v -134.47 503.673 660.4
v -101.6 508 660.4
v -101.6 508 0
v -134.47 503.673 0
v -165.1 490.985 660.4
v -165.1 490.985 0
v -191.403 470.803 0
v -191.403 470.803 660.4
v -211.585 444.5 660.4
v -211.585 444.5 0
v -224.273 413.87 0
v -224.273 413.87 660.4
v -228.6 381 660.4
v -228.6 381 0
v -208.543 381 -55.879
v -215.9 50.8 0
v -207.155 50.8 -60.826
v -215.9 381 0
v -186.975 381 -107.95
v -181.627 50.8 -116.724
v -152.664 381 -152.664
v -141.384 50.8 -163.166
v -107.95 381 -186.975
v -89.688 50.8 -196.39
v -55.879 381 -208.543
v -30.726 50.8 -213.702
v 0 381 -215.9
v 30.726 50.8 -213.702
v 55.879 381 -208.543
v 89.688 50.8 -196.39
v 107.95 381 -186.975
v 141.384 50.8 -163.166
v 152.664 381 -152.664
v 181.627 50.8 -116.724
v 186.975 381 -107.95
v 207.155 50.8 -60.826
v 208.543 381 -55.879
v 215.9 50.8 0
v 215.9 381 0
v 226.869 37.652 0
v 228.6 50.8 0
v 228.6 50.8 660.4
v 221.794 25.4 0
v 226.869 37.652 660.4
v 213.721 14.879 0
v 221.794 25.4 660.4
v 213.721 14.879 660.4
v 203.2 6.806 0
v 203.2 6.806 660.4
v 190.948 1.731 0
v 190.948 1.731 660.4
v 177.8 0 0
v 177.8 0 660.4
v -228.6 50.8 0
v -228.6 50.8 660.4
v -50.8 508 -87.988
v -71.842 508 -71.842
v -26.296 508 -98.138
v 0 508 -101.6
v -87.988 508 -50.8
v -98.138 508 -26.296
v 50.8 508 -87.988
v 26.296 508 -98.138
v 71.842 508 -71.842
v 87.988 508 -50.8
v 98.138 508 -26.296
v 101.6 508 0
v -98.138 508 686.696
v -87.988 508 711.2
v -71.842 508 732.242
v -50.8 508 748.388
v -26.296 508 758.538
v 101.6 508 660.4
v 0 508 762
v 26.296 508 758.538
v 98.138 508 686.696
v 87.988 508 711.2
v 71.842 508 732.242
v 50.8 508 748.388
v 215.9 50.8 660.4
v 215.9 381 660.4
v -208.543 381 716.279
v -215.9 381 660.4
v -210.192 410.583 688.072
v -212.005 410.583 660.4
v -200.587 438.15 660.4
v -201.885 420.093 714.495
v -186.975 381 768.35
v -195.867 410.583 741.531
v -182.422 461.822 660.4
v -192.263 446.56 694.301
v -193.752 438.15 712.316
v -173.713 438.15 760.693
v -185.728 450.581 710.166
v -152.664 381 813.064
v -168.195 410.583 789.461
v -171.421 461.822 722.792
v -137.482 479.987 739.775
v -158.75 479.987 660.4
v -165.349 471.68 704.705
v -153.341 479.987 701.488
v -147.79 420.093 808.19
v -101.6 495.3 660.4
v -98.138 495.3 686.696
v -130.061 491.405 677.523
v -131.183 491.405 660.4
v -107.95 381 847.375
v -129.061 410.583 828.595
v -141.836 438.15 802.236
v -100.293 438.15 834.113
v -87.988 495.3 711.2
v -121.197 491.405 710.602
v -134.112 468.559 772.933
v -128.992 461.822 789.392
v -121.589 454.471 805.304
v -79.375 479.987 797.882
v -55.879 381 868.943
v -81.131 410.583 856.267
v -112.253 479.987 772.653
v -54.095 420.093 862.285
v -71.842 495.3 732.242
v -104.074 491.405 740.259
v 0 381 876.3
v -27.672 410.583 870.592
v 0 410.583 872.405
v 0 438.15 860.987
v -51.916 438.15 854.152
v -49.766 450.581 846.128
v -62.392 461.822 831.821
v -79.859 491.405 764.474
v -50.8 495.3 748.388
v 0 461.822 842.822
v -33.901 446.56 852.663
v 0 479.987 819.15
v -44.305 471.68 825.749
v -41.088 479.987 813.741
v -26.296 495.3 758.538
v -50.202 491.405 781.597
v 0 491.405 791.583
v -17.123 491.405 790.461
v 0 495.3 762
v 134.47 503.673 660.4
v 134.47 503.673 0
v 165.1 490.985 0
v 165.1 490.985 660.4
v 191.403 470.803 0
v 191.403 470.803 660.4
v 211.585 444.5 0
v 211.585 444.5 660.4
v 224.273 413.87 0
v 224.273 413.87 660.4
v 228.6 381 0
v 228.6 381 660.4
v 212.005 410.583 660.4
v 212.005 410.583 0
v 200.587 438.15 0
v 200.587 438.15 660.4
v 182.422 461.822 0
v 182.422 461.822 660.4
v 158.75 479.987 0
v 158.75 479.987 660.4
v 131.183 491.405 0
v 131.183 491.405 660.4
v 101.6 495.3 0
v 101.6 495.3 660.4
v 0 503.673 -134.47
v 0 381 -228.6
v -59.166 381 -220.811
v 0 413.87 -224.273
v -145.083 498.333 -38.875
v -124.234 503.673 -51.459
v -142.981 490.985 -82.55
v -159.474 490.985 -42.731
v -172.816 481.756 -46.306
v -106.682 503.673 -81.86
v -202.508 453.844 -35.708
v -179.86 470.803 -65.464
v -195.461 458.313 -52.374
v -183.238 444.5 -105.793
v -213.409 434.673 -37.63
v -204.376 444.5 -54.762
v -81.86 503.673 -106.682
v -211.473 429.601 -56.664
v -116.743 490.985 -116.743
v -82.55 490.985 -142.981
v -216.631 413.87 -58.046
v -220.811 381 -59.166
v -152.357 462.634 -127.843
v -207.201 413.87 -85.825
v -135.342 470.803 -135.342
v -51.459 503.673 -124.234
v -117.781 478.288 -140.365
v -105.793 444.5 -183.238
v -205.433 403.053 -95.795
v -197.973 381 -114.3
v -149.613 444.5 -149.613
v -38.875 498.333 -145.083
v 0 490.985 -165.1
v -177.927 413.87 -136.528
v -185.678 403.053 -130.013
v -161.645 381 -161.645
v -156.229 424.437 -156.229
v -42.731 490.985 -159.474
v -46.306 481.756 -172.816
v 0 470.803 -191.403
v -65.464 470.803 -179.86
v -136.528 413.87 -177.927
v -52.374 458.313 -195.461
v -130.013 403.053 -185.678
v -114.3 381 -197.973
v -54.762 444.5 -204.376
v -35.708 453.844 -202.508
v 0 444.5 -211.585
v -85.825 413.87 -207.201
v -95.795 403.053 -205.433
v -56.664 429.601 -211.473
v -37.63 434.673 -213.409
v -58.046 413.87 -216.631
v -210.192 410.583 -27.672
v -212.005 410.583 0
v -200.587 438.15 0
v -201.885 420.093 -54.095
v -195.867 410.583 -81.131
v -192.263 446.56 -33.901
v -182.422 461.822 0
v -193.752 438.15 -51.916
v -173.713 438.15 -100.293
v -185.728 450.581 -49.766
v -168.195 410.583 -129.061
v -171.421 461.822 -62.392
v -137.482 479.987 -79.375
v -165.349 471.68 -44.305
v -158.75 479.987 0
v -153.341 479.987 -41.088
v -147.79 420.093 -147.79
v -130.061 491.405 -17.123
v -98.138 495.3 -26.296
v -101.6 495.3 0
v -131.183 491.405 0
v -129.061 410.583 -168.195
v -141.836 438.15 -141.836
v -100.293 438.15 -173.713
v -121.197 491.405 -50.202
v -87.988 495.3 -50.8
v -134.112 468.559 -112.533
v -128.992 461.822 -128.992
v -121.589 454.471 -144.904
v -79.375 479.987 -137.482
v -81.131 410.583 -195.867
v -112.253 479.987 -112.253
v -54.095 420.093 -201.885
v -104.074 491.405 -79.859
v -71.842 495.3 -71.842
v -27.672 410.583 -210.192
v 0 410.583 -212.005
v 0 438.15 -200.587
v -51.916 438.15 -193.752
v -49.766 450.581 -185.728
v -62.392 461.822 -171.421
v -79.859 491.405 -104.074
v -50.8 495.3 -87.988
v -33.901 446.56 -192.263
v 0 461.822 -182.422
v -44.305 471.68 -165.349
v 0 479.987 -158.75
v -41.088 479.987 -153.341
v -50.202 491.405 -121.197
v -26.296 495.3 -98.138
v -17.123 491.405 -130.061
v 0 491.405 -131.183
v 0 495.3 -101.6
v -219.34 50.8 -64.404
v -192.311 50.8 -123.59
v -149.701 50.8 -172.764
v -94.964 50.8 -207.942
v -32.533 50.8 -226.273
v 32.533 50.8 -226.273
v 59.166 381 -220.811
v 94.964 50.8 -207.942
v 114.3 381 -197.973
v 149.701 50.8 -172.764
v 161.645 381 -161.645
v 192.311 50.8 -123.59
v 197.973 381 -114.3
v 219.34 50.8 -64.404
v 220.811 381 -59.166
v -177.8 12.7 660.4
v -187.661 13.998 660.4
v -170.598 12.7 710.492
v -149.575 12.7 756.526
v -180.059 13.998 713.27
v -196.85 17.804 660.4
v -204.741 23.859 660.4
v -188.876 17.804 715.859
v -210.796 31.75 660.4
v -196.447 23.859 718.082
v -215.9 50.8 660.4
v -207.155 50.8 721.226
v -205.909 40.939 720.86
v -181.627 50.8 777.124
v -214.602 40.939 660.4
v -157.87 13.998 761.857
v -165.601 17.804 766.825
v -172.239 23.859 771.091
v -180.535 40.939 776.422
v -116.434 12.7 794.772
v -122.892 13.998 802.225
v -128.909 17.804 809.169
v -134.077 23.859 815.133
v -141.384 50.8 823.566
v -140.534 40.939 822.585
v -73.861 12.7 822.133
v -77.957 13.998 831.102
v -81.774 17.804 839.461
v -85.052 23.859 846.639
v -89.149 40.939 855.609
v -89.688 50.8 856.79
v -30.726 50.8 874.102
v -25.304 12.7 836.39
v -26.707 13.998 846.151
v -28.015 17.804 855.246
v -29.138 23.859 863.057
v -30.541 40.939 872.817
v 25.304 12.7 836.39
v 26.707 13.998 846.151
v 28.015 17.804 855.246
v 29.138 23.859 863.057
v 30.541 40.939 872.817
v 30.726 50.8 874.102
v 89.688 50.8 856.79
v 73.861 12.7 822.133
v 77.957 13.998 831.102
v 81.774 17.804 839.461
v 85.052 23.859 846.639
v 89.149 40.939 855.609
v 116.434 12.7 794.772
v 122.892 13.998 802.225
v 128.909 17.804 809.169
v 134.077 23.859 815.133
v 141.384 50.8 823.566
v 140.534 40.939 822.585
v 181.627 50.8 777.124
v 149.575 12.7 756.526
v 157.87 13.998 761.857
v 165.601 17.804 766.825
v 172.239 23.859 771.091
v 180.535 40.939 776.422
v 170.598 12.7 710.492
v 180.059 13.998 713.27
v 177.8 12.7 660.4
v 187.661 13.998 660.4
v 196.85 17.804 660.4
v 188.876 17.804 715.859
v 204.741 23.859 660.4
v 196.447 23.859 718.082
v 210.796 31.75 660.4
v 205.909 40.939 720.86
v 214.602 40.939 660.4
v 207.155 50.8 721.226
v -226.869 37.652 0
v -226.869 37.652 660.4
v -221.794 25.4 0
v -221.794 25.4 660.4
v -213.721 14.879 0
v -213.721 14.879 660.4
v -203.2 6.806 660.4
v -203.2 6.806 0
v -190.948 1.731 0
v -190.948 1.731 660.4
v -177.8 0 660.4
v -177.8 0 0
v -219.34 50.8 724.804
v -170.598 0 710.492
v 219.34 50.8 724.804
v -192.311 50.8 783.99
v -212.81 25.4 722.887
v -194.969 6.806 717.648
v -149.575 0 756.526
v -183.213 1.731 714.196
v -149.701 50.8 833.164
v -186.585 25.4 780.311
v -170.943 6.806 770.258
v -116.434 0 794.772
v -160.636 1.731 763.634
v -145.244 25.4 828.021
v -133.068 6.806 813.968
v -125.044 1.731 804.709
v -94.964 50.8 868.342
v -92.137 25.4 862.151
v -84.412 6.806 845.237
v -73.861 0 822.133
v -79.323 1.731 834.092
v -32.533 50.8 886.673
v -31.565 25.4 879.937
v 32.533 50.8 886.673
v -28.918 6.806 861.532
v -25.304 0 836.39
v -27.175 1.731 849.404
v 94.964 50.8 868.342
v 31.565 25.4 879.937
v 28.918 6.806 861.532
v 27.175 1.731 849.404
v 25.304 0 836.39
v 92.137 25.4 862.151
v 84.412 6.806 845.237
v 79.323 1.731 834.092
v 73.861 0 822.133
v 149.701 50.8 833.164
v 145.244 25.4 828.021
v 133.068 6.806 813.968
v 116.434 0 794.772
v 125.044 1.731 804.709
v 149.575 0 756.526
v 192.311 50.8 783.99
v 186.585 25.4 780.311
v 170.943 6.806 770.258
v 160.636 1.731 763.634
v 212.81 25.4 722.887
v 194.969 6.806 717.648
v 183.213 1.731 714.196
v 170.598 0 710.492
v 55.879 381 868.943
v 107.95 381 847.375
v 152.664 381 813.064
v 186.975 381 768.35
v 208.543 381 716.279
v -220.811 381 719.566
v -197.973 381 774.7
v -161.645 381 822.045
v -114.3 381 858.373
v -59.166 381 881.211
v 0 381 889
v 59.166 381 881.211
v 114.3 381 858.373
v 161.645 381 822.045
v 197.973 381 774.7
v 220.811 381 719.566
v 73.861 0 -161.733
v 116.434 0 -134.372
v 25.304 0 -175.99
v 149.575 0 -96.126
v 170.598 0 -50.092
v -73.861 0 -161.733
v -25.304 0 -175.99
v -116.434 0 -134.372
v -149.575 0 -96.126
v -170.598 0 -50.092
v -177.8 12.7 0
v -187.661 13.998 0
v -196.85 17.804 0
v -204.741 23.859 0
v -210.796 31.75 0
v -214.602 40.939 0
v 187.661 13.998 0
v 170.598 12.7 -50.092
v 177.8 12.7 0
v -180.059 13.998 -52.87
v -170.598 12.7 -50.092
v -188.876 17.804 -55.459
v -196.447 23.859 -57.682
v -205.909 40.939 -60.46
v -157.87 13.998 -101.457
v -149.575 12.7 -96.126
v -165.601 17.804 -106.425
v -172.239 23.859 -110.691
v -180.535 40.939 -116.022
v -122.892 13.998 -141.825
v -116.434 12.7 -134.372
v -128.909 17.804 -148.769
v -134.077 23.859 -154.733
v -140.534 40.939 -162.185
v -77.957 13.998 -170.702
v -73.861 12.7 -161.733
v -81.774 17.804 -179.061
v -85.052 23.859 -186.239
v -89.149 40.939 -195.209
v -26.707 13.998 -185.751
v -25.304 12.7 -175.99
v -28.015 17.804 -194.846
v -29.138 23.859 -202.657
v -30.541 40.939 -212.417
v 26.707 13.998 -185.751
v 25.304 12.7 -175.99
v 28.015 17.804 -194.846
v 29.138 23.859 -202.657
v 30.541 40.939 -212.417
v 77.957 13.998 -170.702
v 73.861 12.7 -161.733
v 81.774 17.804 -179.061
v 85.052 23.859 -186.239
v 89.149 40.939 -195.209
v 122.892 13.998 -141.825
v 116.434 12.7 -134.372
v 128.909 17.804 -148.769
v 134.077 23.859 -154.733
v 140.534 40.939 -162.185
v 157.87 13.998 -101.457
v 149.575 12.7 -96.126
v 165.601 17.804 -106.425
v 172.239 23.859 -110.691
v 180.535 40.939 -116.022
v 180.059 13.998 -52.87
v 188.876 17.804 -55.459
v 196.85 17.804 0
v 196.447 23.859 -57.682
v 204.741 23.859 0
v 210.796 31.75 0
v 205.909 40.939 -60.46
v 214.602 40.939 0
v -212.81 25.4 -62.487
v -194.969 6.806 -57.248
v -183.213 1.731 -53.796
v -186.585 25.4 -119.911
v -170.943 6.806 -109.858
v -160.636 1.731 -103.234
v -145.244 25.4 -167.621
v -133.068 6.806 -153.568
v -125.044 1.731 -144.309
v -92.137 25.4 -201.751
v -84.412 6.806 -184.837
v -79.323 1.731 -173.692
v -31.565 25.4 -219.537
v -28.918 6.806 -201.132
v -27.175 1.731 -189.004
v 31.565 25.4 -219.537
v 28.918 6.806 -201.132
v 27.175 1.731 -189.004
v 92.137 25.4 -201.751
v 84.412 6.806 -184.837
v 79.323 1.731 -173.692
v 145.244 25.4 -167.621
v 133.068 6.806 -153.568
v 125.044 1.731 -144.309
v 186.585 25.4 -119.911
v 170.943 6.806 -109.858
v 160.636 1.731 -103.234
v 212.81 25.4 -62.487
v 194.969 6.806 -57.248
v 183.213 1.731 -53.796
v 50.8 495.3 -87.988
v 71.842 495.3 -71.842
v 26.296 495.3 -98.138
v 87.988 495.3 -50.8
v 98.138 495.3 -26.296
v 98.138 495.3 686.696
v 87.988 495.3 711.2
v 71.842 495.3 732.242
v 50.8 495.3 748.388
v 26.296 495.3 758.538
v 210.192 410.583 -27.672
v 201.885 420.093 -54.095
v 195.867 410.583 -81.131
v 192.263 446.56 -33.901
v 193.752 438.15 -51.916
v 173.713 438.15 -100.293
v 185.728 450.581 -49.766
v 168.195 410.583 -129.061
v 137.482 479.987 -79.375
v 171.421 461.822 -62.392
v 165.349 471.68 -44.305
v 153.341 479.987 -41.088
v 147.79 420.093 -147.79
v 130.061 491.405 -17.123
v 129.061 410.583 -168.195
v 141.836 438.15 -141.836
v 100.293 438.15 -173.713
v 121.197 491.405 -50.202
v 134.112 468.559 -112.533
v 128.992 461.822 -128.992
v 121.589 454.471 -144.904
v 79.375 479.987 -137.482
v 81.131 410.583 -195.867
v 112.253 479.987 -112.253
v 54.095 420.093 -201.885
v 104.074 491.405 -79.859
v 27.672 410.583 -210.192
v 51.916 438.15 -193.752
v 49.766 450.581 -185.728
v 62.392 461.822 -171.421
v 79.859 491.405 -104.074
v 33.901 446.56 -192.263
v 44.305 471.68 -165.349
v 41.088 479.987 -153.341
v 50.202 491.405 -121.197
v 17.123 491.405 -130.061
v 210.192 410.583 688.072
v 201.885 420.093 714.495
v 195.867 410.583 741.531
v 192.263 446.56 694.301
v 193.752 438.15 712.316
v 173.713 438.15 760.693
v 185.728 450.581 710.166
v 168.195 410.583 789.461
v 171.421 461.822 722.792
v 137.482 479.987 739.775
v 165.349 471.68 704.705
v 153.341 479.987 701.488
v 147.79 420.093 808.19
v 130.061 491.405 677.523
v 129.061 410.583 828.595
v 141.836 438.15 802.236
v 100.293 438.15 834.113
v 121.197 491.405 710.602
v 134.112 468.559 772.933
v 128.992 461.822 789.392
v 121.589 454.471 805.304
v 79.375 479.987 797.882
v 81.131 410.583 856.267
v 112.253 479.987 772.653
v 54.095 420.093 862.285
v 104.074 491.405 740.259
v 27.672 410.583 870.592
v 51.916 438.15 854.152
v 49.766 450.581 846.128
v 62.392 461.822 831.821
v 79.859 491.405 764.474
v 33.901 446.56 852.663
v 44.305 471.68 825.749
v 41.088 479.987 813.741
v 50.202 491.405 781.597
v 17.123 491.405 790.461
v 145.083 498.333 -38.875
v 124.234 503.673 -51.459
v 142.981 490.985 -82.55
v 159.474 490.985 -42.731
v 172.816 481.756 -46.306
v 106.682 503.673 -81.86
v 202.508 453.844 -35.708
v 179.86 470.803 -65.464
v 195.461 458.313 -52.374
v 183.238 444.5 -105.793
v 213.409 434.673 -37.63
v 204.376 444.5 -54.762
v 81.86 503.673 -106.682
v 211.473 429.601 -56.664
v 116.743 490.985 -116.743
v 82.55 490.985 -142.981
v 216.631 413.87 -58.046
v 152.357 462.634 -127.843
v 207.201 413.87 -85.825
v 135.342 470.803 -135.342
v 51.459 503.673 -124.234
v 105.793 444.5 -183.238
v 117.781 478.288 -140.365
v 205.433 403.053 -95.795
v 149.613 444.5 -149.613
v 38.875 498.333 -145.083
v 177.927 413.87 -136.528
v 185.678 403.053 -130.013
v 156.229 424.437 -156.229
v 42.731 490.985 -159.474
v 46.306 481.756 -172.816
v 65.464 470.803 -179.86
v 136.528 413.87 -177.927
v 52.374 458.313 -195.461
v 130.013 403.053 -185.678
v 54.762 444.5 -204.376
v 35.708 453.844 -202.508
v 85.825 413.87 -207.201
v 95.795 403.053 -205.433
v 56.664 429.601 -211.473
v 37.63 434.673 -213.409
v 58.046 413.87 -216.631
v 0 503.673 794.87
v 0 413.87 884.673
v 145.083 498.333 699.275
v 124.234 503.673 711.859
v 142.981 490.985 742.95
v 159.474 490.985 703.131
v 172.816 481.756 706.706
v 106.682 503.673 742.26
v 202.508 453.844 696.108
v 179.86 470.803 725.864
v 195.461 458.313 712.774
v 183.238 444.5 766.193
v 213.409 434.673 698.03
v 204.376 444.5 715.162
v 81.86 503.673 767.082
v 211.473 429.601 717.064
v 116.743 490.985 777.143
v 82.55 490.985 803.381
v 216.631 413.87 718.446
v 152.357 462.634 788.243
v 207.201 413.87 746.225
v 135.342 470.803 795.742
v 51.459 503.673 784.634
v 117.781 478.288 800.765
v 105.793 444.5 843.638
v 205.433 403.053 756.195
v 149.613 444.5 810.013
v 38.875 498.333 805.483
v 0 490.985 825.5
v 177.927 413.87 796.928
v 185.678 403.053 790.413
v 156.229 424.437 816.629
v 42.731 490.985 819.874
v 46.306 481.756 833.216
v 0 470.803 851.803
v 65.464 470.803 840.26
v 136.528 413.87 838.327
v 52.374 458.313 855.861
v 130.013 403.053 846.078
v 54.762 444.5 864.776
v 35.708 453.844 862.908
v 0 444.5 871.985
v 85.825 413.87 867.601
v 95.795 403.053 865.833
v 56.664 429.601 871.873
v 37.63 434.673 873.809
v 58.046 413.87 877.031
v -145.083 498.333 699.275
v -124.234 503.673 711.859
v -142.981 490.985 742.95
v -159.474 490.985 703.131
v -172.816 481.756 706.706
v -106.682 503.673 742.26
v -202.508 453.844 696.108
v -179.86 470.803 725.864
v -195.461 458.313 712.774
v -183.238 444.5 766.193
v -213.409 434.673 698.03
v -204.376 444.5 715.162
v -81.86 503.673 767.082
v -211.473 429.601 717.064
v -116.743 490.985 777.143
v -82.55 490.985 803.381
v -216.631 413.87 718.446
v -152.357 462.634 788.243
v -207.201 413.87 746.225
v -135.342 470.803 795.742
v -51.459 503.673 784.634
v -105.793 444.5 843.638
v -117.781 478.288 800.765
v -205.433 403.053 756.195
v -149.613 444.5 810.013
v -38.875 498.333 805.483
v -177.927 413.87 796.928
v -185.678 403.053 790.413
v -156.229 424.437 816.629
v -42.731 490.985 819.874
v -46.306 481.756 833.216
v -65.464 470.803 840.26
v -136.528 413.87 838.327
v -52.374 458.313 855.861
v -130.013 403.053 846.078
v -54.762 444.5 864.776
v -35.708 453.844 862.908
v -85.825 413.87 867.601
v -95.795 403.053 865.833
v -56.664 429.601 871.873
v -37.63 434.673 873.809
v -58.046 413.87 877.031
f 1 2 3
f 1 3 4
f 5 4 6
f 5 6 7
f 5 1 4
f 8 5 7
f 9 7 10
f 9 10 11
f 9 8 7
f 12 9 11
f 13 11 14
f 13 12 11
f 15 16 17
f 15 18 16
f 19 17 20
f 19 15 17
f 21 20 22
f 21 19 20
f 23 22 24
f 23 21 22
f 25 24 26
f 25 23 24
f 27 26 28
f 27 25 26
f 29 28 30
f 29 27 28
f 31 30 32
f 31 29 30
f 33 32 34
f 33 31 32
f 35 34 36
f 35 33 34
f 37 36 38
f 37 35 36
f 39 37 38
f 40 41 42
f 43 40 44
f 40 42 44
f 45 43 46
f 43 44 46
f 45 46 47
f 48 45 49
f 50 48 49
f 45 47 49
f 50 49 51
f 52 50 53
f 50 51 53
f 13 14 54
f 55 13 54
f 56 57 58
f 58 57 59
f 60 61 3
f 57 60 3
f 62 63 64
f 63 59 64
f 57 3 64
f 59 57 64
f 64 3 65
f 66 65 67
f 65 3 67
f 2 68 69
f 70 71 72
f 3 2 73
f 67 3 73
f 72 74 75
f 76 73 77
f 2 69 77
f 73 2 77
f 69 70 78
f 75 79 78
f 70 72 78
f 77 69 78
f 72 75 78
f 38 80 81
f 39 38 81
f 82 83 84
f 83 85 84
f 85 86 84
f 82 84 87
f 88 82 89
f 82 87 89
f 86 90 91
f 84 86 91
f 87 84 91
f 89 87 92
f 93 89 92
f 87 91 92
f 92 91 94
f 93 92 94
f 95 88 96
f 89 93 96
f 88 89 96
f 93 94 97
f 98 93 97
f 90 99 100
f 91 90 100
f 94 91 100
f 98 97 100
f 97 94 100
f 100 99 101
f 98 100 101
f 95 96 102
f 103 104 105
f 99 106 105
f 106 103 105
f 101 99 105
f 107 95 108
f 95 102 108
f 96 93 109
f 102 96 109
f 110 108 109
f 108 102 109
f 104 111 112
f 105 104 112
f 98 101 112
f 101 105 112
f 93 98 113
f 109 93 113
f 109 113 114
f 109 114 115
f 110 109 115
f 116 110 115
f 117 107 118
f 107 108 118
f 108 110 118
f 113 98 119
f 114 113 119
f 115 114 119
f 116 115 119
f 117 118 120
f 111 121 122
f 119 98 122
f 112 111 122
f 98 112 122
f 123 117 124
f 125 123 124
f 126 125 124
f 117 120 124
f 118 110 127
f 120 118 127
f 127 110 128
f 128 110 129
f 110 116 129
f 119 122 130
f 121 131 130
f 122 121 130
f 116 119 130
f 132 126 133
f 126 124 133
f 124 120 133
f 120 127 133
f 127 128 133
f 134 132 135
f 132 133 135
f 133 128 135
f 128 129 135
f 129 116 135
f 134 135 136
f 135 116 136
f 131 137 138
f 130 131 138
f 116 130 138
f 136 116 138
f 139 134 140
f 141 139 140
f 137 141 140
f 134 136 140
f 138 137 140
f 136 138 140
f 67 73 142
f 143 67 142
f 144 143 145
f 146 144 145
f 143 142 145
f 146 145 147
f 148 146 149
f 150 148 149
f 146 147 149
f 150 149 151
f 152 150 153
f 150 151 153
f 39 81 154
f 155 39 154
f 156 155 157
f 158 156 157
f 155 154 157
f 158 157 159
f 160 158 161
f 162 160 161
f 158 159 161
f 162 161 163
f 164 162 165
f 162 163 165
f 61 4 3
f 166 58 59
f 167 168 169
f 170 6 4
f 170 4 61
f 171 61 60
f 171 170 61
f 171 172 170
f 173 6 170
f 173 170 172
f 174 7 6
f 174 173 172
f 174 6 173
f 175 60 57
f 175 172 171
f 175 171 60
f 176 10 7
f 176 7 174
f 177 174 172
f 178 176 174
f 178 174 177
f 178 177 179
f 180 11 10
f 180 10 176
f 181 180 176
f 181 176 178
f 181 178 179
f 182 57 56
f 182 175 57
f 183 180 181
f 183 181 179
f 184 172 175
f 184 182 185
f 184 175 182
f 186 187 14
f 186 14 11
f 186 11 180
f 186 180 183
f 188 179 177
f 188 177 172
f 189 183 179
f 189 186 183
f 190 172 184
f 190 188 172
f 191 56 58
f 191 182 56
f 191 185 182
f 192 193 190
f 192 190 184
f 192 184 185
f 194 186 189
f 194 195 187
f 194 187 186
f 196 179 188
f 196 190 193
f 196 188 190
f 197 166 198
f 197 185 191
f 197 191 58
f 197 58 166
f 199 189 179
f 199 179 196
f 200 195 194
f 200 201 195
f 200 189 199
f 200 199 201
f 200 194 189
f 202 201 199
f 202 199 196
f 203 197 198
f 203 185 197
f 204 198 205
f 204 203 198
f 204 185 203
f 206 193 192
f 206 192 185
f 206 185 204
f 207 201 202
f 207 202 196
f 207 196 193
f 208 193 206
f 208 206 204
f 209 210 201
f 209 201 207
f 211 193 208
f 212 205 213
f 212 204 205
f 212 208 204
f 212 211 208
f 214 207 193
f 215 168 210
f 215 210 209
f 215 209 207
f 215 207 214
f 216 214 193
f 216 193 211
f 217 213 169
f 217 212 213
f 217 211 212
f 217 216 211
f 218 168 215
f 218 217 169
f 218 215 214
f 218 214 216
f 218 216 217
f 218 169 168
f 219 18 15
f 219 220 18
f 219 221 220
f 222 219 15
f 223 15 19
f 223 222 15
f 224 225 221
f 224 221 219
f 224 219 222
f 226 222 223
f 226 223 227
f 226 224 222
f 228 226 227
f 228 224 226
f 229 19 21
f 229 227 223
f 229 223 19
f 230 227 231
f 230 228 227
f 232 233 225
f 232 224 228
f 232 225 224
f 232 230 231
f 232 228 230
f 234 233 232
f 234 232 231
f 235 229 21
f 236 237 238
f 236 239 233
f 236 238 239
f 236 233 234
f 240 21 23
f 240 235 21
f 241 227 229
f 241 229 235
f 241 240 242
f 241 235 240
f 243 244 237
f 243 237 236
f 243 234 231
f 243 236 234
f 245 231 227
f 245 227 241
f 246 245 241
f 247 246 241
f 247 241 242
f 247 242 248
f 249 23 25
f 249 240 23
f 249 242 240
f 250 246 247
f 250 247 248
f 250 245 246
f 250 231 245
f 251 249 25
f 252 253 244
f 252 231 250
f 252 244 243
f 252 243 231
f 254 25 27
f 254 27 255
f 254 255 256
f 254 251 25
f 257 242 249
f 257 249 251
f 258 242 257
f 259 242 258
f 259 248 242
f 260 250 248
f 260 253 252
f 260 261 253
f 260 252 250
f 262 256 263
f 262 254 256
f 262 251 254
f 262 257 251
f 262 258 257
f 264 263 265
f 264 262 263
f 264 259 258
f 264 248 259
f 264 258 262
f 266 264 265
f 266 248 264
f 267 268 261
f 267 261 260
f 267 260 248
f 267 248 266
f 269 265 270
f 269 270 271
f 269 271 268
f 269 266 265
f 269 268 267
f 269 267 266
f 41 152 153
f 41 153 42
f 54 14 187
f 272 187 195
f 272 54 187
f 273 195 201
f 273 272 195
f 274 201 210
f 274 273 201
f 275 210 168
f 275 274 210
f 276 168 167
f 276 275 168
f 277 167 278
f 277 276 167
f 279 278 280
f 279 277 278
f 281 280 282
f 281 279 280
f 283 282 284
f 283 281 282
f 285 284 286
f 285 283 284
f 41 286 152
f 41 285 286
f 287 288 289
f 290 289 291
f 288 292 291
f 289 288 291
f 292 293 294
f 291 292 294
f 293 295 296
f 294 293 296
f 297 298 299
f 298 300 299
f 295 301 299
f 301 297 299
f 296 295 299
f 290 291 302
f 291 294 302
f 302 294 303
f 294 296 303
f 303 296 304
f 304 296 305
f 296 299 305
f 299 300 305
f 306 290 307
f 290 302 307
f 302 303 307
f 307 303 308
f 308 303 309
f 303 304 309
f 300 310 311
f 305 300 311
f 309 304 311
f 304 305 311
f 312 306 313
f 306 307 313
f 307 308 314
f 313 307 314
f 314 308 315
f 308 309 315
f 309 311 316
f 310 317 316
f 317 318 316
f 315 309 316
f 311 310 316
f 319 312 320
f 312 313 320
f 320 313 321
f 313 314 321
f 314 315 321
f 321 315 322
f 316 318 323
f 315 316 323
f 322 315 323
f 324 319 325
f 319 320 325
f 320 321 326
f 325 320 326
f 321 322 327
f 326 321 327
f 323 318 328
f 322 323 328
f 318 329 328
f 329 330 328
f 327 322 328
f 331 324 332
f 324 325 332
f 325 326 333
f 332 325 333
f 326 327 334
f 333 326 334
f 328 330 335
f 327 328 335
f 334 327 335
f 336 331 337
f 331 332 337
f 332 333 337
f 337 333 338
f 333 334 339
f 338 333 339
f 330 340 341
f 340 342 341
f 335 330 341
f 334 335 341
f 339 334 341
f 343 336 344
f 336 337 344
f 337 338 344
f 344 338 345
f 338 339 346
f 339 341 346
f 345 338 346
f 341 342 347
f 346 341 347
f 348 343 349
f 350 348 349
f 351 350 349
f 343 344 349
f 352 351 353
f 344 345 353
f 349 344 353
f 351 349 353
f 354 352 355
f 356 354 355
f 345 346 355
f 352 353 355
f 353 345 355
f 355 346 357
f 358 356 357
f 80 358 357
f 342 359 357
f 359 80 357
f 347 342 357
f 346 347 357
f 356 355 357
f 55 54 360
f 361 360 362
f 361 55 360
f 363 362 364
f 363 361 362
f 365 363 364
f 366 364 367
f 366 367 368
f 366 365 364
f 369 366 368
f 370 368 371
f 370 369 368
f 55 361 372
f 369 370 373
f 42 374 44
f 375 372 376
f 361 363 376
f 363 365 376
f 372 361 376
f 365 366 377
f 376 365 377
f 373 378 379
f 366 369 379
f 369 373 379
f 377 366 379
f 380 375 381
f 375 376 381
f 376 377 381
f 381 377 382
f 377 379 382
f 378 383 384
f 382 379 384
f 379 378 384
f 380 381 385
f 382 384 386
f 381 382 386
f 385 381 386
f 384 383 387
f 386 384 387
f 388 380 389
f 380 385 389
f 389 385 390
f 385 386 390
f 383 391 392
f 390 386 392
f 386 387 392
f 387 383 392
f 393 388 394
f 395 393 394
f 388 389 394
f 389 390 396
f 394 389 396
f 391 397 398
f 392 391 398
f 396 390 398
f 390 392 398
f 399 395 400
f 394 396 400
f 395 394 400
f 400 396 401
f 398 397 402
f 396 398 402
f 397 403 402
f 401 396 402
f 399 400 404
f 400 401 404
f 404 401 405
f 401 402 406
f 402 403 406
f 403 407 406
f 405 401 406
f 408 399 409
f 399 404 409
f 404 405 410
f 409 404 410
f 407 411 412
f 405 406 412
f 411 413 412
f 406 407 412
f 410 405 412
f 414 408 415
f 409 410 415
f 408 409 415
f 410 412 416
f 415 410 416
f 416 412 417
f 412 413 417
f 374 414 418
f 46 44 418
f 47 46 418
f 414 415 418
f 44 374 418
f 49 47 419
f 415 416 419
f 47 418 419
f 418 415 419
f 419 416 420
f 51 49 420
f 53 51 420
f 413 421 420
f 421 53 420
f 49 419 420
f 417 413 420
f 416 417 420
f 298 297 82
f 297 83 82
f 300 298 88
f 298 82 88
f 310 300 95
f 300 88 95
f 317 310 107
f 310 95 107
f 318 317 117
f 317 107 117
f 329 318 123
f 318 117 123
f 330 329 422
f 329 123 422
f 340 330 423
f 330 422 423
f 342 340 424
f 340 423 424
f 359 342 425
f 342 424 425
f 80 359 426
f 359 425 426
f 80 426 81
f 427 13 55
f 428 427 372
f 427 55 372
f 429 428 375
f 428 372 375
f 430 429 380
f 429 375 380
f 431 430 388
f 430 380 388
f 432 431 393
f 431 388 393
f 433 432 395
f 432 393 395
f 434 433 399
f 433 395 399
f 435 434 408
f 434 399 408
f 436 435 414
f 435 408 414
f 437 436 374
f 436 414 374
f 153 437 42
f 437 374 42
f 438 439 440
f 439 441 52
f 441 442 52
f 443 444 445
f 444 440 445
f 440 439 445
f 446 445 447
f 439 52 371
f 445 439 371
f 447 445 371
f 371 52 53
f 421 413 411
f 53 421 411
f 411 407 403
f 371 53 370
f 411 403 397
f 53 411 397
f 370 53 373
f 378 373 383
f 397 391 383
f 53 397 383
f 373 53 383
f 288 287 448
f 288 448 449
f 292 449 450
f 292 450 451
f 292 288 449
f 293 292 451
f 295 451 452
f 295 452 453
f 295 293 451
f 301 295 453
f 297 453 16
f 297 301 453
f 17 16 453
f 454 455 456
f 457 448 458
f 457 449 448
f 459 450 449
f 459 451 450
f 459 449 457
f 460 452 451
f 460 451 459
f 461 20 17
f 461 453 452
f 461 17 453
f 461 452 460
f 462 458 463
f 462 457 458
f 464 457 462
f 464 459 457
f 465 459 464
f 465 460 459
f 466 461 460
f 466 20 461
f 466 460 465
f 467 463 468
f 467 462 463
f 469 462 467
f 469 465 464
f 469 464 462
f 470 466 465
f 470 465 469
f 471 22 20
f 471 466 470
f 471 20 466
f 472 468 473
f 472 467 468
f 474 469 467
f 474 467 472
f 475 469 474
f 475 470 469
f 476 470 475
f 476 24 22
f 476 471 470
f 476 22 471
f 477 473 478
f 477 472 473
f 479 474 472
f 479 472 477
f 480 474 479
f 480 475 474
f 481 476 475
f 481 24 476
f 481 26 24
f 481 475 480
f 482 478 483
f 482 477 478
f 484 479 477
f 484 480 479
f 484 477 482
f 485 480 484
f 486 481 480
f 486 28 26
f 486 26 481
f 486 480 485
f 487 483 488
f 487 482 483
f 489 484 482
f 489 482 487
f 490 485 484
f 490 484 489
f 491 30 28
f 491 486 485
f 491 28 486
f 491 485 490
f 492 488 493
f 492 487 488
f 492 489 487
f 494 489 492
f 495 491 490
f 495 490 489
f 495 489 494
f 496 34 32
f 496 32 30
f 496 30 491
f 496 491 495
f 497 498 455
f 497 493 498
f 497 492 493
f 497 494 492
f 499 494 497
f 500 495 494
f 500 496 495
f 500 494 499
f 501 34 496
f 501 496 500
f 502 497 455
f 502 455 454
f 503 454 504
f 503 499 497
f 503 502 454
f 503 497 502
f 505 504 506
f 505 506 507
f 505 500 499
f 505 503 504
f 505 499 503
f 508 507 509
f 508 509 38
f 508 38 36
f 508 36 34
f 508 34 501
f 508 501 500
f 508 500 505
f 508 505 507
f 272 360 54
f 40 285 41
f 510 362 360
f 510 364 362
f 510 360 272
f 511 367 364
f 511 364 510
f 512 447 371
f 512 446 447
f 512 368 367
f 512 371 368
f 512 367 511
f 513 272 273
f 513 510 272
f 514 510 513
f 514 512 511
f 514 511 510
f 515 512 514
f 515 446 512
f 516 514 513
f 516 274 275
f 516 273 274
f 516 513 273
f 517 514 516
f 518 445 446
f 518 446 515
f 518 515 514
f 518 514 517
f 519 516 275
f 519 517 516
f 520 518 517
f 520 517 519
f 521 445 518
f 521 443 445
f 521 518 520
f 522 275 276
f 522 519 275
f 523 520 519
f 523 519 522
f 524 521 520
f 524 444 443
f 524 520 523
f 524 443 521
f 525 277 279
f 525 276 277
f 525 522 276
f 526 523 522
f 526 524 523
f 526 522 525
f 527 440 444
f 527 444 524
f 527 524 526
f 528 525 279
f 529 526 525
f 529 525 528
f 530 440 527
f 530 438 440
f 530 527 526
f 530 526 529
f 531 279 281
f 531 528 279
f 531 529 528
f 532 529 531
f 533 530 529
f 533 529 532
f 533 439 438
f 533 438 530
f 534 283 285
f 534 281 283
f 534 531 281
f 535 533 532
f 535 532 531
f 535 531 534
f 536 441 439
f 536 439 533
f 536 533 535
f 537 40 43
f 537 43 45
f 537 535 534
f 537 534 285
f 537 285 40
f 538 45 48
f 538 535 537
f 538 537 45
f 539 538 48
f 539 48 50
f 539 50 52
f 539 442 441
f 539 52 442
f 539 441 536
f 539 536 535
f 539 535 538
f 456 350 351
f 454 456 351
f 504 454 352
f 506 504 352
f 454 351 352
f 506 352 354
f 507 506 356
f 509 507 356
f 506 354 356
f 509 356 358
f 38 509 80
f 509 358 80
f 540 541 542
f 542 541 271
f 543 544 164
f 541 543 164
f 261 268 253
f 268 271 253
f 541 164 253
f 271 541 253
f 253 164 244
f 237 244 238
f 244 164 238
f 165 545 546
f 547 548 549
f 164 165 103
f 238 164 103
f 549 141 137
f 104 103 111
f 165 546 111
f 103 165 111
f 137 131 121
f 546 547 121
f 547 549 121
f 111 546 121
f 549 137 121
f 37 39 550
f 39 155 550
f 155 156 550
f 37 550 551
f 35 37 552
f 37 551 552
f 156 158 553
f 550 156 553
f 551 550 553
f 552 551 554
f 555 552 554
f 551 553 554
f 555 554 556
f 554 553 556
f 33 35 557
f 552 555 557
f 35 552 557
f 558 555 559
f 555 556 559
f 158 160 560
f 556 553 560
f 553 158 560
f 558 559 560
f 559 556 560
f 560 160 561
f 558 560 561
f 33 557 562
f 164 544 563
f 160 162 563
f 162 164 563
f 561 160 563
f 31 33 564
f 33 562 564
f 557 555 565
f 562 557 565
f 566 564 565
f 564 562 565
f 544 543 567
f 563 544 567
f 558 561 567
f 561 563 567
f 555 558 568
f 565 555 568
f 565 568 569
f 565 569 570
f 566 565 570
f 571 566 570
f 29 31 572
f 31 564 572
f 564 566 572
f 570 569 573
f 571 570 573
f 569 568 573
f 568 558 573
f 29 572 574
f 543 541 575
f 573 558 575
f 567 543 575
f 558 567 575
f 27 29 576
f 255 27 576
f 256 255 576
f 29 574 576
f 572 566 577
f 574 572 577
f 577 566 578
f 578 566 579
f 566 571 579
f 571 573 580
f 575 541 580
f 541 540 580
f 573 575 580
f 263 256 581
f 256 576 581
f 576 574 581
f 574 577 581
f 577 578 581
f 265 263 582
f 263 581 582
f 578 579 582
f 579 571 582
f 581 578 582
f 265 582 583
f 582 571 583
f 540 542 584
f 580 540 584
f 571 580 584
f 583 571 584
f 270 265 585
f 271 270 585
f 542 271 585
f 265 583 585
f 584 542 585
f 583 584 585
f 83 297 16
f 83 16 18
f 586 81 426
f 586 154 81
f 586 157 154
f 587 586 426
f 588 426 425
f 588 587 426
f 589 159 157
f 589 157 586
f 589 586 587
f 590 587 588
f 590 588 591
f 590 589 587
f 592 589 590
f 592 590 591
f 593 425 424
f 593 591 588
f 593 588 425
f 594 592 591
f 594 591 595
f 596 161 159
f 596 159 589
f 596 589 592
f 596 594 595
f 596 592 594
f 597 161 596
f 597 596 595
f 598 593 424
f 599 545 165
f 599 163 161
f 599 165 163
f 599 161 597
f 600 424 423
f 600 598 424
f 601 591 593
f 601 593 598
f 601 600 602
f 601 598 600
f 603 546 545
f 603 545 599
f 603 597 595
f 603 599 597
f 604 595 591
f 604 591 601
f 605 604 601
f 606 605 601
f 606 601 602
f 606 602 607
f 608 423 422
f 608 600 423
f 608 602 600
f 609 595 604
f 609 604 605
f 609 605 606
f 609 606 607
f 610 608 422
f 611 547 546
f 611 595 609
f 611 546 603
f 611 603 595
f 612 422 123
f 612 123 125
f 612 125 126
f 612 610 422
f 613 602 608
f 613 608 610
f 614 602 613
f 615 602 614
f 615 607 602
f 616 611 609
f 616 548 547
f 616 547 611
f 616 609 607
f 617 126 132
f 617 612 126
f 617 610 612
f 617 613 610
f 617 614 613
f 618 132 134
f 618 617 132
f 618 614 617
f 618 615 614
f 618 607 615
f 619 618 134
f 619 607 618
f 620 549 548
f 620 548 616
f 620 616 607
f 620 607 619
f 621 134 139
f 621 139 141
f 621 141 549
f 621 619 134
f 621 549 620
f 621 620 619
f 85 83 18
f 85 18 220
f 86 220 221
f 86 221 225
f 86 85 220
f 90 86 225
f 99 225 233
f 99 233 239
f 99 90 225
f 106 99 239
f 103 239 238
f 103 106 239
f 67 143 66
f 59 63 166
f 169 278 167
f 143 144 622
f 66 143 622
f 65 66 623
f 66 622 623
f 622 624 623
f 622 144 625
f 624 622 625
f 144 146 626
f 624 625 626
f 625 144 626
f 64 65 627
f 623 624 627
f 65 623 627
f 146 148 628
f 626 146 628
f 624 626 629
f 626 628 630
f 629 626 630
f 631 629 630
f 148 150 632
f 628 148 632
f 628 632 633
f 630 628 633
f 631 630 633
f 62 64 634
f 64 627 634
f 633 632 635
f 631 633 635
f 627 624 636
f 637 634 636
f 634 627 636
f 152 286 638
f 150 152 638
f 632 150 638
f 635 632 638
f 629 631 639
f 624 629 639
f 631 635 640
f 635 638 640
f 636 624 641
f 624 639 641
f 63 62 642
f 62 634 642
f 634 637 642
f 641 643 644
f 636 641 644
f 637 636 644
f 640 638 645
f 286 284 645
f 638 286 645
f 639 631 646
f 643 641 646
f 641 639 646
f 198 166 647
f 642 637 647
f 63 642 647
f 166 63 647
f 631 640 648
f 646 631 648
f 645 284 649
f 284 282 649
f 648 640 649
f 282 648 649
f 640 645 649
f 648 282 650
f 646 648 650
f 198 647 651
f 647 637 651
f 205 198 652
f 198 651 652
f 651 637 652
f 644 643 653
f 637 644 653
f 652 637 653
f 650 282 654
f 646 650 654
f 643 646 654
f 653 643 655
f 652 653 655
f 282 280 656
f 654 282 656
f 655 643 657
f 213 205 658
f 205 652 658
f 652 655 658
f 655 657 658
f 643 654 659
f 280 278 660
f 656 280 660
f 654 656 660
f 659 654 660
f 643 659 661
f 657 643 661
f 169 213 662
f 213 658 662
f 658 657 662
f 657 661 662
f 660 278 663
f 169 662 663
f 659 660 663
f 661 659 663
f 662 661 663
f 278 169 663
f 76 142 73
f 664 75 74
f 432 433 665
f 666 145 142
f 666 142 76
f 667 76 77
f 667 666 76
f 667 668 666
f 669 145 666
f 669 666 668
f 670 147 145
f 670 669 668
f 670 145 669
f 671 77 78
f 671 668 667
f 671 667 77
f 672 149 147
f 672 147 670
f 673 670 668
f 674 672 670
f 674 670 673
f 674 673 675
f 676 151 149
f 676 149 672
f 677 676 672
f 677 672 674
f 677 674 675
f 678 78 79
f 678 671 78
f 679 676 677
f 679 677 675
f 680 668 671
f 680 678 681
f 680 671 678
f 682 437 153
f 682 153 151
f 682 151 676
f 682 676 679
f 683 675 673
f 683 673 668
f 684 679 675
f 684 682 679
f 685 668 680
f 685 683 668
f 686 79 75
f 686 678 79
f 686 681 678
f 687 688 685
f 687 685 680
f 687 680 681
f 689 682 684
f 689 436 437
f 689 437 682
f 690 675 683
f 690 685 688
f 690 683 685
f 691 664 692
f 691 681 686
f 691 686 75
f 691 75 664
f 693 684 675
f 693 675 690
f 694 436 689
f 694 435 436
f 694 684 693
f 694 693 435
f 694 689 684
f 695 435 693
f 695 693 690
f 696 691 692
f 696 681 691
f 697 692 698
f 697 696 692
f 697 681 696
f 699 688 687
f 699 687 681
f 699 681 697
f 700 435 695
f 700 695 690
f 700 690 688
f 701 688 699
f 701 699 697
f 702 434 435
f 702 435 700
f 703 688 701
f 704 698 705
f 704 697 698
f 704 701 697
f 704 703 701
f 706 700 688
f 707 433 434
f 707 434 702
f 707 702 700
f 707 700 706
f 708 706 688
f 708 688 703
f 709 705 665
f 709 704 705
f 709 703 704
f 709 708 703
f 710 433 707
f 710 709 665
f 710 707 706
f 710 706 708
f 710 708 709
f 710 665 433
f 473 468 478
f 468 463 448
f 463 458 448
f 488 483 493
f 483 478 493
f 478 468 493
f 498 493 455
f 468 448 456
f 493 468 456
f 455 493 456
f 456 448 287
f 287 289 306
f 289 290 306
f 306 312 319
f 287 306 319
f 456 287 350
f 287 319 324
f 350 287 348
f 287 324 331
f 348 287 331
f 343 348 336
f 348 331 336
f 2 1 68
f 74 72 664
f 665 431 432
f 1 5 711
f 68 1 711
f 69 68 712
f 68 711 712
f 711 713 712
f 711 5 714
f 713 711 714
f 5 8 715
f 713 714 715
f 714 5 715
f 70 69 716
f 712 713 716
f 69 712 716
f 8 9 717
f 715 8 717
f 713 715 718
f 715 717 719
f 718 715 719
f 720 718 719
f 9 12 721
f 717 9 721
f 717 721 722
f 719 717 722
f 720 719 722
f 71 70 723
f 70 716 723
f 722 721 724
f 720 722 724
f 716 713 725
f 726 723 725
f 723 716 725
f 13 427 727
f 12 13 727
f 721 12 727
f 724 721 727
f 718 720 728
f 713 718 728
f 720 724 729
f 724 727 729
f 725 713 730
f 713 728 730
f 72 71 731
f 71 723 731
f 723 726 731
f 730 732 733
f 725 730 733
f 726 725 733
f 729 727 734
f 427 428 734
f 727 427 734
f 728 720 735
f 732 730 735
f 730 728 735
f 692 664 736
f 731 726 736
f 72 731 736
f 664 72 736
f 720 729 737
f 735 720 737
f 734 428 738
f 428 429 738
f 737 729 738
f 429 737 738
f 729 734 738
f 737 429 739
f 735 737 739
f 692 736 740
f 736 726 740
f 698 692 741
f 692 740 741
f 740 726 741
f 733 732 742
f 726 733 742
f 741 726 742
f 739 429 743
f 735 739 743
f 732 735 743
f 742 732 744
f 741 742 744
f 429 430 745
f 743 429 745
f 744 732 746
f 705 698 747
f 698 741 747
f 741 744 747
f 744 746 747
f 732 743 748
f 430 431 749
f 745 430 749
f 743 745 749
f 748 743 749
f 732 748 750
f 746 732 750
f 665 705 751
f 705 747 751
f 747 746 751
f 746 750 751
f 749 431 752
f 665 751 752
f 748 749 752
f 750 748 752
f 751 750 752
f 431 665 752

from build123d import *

# Parameters (mm, degrees)
BOSS_EXTRUDE1_DEPTH  = 330.2
REVOLVE1_ANGLE       = 90
MIRROR2_COPY_1_DEPTH = 330.2
MIRROR2_COPY_2_ANGLE = 90


with BuildPart() as part:
    # Sketch1 → Boss-Extrude1 (new body)
    with BuildSketch(Plane.XY):
        with BuildLine():
            Line((0, 12.7), (177.8, 12.7))
            ThreePointArc((177.8, 12.7), (204.740768363, 23.859231637), (215.9, 50.8))
            Line((215.9, 50.8), (215.9, 381))
            ThreePointArc((215.9, 381), (182.42230509, 461.82230509), (101.6, 495.3))
            Line((101.6, 495.3), (0, 495.3))
            Line((0, 495.3), (0, 508))
            Line((0, 508), (101.6, 508))
            ThreePointArc((101.6, 508), (191.402561211, 470.802561211), (228.6, 381))
            Line((228.6, 381), (228.6, 50.8))
            ThreePointArc((228.6, 50.8), (213.721024484, 14.878975516), (177.8, 0))
            Line((177.8, 0), (0, 0))
            Line((0, 0), (0, 12.7))
        make_face()
    boss_extrude1 = extrude(amount=BOSS_EXTRUDE1_DEPTH)

    # Sketch1<2> → Revolve1 (revolve)
    with BuildSketch(Plane.XY):
        with BuildLine():
            Line((0, 12.7), (177.8, 12.7))
            ThreePointArc((177.8, 12.7), (204.740768363, 23.859231637), (215.9, 50.8))
            Line((215.9, 50.8), (215.9, 381))
            ThreePointArc((215.9, 381), (182.42230509, 461.82230509), (101.6, 495.3))
            Line((101.6, 495.3), (0, 495.3))
            Line((0, 495.3), (0, 508))
            Line((0, 508), (101.6, 508))
            ThreePointArc((101.6, 508), (191.402561211, 470.802561211), (228.6, 381))
            Line((228.6, 381), (228.6, 50.8))
            ThreePointArc((228.6, 50.8), (213.721024484, 14.878975516), (177.8, 0))
            Line((177.8, 0), (0, 0))
            Line((0, 0), (0, 12.7))
        make_face()
    revolve1 = revolve(axis=Axis((0, 0, 0), (0, 1, 0)), revolution_arc=REVOLVE1_ANGLE)

    # Mirror1: Boss-Extrude1, Revolve1 across plane
    add(boss_extrude1.mirror(Plane(origin=(0, 0, 0), x_dir=(0, 0, 1), z_dir=(1, 0, 0))))
    add(revolve1.mirror(Plane(origin=(0, 0, 0), x_dir=(0, 0, 1), z_dir=(1, 0, 0))))

    # Mirror2: Boss-Extrude1, Revolve1 across plane
    add(boss_extrude1.mirror(Plane(origin=(177.8, 50.8, 330.2), x_dir=(1, 0, 0), z_dir=(0, 0, 1))))
    add(revolve1.mirror(Plane(origin=(177.8, 50.8, 330.2), x_dir=(1, 0, 0), z_dir=(0, 0, 1))))

    # Mirror2 copy 1 sketch → Mirror2 copy 1 (add)
    with BuildSketch(Plane(origin=(0, 0, 660.4), x_dir=(-1, 0, 0), z_dir=(0, 0, -1))):
        with BuildLine():
            Line((0, 12.7), (177.8, 12.7))
            ThreePointArc((177.8, 12.7), (204.740768363, 23.859231637), (215.9, 50.8))
            Line((215.9, 50.8), (215.9, 381))
            ThreePointArc((215.9, 381), (182.42230509, 461.82230509), (101.6, 495.3))
            Line((101.6, 495.3), (0, 495.3))
            Line((0, 495.3), (0, 508))
            Line((0, 508), (101.6, 508))
            ThreePointArc((101.6, 508), (191.402561211, 470.802561211), (228.6, 381))
            Line((228.6, 381), (228.6, 50.8))
            ThreePointArc((228.6, 50.8), (213.721024484, 14.878975516), (177.8, 0))
            Line((177.8, 0), (0, 0))
            Line((0, 0), (0, 12.7))
        make_face()
    extrude(amount=MIRROR2_COPY_1_DEPTH)

    # Mirror2 copy 2 sketch → Mirror2 copy 2 (revolve)
    with BuildSketch(Plane(origin=(0, 0, 660.4), x_dir=(-1, 0, 0), z_dir=(0, 0, -1))):
        with BuildLine():
            Line((0, 12.7), (177.8, 12.7))
            ThreePointArc((177.8, 12.7), (204.740768363, 23.859231637), (215.9, 50.8))
            Line((215.9, 50.8), (215.9, 381))
            ThreePointArc((215.9, 381), (182.42230509, 461.82230509), (101.6, 495.3))
            Line((101.6, 495.3), (0, 495.3))
            Line((0, 495.3), (0, 508))
            Line((0, 508), (101.6, 508))
            ThreePointArc((101.6, 508), (191.402561211, 470.802561211), (228.6, 381))
            Line((228.6, 381), (228.6, 50.8))
            ThreePointArc((228.6, 50.8), (213.721024484, 14.878975516), (177.8, 0))
            Line((177.8, 0), (0, 0))
            Line((0, 0), (0, 12.7))
        make_face()
    revolve(axis=Axis((0, 0, 660.4), (0, 1, 0)), revolution_arc=MIRROR2_COPY_2_ANGLE)


solid = part.part
